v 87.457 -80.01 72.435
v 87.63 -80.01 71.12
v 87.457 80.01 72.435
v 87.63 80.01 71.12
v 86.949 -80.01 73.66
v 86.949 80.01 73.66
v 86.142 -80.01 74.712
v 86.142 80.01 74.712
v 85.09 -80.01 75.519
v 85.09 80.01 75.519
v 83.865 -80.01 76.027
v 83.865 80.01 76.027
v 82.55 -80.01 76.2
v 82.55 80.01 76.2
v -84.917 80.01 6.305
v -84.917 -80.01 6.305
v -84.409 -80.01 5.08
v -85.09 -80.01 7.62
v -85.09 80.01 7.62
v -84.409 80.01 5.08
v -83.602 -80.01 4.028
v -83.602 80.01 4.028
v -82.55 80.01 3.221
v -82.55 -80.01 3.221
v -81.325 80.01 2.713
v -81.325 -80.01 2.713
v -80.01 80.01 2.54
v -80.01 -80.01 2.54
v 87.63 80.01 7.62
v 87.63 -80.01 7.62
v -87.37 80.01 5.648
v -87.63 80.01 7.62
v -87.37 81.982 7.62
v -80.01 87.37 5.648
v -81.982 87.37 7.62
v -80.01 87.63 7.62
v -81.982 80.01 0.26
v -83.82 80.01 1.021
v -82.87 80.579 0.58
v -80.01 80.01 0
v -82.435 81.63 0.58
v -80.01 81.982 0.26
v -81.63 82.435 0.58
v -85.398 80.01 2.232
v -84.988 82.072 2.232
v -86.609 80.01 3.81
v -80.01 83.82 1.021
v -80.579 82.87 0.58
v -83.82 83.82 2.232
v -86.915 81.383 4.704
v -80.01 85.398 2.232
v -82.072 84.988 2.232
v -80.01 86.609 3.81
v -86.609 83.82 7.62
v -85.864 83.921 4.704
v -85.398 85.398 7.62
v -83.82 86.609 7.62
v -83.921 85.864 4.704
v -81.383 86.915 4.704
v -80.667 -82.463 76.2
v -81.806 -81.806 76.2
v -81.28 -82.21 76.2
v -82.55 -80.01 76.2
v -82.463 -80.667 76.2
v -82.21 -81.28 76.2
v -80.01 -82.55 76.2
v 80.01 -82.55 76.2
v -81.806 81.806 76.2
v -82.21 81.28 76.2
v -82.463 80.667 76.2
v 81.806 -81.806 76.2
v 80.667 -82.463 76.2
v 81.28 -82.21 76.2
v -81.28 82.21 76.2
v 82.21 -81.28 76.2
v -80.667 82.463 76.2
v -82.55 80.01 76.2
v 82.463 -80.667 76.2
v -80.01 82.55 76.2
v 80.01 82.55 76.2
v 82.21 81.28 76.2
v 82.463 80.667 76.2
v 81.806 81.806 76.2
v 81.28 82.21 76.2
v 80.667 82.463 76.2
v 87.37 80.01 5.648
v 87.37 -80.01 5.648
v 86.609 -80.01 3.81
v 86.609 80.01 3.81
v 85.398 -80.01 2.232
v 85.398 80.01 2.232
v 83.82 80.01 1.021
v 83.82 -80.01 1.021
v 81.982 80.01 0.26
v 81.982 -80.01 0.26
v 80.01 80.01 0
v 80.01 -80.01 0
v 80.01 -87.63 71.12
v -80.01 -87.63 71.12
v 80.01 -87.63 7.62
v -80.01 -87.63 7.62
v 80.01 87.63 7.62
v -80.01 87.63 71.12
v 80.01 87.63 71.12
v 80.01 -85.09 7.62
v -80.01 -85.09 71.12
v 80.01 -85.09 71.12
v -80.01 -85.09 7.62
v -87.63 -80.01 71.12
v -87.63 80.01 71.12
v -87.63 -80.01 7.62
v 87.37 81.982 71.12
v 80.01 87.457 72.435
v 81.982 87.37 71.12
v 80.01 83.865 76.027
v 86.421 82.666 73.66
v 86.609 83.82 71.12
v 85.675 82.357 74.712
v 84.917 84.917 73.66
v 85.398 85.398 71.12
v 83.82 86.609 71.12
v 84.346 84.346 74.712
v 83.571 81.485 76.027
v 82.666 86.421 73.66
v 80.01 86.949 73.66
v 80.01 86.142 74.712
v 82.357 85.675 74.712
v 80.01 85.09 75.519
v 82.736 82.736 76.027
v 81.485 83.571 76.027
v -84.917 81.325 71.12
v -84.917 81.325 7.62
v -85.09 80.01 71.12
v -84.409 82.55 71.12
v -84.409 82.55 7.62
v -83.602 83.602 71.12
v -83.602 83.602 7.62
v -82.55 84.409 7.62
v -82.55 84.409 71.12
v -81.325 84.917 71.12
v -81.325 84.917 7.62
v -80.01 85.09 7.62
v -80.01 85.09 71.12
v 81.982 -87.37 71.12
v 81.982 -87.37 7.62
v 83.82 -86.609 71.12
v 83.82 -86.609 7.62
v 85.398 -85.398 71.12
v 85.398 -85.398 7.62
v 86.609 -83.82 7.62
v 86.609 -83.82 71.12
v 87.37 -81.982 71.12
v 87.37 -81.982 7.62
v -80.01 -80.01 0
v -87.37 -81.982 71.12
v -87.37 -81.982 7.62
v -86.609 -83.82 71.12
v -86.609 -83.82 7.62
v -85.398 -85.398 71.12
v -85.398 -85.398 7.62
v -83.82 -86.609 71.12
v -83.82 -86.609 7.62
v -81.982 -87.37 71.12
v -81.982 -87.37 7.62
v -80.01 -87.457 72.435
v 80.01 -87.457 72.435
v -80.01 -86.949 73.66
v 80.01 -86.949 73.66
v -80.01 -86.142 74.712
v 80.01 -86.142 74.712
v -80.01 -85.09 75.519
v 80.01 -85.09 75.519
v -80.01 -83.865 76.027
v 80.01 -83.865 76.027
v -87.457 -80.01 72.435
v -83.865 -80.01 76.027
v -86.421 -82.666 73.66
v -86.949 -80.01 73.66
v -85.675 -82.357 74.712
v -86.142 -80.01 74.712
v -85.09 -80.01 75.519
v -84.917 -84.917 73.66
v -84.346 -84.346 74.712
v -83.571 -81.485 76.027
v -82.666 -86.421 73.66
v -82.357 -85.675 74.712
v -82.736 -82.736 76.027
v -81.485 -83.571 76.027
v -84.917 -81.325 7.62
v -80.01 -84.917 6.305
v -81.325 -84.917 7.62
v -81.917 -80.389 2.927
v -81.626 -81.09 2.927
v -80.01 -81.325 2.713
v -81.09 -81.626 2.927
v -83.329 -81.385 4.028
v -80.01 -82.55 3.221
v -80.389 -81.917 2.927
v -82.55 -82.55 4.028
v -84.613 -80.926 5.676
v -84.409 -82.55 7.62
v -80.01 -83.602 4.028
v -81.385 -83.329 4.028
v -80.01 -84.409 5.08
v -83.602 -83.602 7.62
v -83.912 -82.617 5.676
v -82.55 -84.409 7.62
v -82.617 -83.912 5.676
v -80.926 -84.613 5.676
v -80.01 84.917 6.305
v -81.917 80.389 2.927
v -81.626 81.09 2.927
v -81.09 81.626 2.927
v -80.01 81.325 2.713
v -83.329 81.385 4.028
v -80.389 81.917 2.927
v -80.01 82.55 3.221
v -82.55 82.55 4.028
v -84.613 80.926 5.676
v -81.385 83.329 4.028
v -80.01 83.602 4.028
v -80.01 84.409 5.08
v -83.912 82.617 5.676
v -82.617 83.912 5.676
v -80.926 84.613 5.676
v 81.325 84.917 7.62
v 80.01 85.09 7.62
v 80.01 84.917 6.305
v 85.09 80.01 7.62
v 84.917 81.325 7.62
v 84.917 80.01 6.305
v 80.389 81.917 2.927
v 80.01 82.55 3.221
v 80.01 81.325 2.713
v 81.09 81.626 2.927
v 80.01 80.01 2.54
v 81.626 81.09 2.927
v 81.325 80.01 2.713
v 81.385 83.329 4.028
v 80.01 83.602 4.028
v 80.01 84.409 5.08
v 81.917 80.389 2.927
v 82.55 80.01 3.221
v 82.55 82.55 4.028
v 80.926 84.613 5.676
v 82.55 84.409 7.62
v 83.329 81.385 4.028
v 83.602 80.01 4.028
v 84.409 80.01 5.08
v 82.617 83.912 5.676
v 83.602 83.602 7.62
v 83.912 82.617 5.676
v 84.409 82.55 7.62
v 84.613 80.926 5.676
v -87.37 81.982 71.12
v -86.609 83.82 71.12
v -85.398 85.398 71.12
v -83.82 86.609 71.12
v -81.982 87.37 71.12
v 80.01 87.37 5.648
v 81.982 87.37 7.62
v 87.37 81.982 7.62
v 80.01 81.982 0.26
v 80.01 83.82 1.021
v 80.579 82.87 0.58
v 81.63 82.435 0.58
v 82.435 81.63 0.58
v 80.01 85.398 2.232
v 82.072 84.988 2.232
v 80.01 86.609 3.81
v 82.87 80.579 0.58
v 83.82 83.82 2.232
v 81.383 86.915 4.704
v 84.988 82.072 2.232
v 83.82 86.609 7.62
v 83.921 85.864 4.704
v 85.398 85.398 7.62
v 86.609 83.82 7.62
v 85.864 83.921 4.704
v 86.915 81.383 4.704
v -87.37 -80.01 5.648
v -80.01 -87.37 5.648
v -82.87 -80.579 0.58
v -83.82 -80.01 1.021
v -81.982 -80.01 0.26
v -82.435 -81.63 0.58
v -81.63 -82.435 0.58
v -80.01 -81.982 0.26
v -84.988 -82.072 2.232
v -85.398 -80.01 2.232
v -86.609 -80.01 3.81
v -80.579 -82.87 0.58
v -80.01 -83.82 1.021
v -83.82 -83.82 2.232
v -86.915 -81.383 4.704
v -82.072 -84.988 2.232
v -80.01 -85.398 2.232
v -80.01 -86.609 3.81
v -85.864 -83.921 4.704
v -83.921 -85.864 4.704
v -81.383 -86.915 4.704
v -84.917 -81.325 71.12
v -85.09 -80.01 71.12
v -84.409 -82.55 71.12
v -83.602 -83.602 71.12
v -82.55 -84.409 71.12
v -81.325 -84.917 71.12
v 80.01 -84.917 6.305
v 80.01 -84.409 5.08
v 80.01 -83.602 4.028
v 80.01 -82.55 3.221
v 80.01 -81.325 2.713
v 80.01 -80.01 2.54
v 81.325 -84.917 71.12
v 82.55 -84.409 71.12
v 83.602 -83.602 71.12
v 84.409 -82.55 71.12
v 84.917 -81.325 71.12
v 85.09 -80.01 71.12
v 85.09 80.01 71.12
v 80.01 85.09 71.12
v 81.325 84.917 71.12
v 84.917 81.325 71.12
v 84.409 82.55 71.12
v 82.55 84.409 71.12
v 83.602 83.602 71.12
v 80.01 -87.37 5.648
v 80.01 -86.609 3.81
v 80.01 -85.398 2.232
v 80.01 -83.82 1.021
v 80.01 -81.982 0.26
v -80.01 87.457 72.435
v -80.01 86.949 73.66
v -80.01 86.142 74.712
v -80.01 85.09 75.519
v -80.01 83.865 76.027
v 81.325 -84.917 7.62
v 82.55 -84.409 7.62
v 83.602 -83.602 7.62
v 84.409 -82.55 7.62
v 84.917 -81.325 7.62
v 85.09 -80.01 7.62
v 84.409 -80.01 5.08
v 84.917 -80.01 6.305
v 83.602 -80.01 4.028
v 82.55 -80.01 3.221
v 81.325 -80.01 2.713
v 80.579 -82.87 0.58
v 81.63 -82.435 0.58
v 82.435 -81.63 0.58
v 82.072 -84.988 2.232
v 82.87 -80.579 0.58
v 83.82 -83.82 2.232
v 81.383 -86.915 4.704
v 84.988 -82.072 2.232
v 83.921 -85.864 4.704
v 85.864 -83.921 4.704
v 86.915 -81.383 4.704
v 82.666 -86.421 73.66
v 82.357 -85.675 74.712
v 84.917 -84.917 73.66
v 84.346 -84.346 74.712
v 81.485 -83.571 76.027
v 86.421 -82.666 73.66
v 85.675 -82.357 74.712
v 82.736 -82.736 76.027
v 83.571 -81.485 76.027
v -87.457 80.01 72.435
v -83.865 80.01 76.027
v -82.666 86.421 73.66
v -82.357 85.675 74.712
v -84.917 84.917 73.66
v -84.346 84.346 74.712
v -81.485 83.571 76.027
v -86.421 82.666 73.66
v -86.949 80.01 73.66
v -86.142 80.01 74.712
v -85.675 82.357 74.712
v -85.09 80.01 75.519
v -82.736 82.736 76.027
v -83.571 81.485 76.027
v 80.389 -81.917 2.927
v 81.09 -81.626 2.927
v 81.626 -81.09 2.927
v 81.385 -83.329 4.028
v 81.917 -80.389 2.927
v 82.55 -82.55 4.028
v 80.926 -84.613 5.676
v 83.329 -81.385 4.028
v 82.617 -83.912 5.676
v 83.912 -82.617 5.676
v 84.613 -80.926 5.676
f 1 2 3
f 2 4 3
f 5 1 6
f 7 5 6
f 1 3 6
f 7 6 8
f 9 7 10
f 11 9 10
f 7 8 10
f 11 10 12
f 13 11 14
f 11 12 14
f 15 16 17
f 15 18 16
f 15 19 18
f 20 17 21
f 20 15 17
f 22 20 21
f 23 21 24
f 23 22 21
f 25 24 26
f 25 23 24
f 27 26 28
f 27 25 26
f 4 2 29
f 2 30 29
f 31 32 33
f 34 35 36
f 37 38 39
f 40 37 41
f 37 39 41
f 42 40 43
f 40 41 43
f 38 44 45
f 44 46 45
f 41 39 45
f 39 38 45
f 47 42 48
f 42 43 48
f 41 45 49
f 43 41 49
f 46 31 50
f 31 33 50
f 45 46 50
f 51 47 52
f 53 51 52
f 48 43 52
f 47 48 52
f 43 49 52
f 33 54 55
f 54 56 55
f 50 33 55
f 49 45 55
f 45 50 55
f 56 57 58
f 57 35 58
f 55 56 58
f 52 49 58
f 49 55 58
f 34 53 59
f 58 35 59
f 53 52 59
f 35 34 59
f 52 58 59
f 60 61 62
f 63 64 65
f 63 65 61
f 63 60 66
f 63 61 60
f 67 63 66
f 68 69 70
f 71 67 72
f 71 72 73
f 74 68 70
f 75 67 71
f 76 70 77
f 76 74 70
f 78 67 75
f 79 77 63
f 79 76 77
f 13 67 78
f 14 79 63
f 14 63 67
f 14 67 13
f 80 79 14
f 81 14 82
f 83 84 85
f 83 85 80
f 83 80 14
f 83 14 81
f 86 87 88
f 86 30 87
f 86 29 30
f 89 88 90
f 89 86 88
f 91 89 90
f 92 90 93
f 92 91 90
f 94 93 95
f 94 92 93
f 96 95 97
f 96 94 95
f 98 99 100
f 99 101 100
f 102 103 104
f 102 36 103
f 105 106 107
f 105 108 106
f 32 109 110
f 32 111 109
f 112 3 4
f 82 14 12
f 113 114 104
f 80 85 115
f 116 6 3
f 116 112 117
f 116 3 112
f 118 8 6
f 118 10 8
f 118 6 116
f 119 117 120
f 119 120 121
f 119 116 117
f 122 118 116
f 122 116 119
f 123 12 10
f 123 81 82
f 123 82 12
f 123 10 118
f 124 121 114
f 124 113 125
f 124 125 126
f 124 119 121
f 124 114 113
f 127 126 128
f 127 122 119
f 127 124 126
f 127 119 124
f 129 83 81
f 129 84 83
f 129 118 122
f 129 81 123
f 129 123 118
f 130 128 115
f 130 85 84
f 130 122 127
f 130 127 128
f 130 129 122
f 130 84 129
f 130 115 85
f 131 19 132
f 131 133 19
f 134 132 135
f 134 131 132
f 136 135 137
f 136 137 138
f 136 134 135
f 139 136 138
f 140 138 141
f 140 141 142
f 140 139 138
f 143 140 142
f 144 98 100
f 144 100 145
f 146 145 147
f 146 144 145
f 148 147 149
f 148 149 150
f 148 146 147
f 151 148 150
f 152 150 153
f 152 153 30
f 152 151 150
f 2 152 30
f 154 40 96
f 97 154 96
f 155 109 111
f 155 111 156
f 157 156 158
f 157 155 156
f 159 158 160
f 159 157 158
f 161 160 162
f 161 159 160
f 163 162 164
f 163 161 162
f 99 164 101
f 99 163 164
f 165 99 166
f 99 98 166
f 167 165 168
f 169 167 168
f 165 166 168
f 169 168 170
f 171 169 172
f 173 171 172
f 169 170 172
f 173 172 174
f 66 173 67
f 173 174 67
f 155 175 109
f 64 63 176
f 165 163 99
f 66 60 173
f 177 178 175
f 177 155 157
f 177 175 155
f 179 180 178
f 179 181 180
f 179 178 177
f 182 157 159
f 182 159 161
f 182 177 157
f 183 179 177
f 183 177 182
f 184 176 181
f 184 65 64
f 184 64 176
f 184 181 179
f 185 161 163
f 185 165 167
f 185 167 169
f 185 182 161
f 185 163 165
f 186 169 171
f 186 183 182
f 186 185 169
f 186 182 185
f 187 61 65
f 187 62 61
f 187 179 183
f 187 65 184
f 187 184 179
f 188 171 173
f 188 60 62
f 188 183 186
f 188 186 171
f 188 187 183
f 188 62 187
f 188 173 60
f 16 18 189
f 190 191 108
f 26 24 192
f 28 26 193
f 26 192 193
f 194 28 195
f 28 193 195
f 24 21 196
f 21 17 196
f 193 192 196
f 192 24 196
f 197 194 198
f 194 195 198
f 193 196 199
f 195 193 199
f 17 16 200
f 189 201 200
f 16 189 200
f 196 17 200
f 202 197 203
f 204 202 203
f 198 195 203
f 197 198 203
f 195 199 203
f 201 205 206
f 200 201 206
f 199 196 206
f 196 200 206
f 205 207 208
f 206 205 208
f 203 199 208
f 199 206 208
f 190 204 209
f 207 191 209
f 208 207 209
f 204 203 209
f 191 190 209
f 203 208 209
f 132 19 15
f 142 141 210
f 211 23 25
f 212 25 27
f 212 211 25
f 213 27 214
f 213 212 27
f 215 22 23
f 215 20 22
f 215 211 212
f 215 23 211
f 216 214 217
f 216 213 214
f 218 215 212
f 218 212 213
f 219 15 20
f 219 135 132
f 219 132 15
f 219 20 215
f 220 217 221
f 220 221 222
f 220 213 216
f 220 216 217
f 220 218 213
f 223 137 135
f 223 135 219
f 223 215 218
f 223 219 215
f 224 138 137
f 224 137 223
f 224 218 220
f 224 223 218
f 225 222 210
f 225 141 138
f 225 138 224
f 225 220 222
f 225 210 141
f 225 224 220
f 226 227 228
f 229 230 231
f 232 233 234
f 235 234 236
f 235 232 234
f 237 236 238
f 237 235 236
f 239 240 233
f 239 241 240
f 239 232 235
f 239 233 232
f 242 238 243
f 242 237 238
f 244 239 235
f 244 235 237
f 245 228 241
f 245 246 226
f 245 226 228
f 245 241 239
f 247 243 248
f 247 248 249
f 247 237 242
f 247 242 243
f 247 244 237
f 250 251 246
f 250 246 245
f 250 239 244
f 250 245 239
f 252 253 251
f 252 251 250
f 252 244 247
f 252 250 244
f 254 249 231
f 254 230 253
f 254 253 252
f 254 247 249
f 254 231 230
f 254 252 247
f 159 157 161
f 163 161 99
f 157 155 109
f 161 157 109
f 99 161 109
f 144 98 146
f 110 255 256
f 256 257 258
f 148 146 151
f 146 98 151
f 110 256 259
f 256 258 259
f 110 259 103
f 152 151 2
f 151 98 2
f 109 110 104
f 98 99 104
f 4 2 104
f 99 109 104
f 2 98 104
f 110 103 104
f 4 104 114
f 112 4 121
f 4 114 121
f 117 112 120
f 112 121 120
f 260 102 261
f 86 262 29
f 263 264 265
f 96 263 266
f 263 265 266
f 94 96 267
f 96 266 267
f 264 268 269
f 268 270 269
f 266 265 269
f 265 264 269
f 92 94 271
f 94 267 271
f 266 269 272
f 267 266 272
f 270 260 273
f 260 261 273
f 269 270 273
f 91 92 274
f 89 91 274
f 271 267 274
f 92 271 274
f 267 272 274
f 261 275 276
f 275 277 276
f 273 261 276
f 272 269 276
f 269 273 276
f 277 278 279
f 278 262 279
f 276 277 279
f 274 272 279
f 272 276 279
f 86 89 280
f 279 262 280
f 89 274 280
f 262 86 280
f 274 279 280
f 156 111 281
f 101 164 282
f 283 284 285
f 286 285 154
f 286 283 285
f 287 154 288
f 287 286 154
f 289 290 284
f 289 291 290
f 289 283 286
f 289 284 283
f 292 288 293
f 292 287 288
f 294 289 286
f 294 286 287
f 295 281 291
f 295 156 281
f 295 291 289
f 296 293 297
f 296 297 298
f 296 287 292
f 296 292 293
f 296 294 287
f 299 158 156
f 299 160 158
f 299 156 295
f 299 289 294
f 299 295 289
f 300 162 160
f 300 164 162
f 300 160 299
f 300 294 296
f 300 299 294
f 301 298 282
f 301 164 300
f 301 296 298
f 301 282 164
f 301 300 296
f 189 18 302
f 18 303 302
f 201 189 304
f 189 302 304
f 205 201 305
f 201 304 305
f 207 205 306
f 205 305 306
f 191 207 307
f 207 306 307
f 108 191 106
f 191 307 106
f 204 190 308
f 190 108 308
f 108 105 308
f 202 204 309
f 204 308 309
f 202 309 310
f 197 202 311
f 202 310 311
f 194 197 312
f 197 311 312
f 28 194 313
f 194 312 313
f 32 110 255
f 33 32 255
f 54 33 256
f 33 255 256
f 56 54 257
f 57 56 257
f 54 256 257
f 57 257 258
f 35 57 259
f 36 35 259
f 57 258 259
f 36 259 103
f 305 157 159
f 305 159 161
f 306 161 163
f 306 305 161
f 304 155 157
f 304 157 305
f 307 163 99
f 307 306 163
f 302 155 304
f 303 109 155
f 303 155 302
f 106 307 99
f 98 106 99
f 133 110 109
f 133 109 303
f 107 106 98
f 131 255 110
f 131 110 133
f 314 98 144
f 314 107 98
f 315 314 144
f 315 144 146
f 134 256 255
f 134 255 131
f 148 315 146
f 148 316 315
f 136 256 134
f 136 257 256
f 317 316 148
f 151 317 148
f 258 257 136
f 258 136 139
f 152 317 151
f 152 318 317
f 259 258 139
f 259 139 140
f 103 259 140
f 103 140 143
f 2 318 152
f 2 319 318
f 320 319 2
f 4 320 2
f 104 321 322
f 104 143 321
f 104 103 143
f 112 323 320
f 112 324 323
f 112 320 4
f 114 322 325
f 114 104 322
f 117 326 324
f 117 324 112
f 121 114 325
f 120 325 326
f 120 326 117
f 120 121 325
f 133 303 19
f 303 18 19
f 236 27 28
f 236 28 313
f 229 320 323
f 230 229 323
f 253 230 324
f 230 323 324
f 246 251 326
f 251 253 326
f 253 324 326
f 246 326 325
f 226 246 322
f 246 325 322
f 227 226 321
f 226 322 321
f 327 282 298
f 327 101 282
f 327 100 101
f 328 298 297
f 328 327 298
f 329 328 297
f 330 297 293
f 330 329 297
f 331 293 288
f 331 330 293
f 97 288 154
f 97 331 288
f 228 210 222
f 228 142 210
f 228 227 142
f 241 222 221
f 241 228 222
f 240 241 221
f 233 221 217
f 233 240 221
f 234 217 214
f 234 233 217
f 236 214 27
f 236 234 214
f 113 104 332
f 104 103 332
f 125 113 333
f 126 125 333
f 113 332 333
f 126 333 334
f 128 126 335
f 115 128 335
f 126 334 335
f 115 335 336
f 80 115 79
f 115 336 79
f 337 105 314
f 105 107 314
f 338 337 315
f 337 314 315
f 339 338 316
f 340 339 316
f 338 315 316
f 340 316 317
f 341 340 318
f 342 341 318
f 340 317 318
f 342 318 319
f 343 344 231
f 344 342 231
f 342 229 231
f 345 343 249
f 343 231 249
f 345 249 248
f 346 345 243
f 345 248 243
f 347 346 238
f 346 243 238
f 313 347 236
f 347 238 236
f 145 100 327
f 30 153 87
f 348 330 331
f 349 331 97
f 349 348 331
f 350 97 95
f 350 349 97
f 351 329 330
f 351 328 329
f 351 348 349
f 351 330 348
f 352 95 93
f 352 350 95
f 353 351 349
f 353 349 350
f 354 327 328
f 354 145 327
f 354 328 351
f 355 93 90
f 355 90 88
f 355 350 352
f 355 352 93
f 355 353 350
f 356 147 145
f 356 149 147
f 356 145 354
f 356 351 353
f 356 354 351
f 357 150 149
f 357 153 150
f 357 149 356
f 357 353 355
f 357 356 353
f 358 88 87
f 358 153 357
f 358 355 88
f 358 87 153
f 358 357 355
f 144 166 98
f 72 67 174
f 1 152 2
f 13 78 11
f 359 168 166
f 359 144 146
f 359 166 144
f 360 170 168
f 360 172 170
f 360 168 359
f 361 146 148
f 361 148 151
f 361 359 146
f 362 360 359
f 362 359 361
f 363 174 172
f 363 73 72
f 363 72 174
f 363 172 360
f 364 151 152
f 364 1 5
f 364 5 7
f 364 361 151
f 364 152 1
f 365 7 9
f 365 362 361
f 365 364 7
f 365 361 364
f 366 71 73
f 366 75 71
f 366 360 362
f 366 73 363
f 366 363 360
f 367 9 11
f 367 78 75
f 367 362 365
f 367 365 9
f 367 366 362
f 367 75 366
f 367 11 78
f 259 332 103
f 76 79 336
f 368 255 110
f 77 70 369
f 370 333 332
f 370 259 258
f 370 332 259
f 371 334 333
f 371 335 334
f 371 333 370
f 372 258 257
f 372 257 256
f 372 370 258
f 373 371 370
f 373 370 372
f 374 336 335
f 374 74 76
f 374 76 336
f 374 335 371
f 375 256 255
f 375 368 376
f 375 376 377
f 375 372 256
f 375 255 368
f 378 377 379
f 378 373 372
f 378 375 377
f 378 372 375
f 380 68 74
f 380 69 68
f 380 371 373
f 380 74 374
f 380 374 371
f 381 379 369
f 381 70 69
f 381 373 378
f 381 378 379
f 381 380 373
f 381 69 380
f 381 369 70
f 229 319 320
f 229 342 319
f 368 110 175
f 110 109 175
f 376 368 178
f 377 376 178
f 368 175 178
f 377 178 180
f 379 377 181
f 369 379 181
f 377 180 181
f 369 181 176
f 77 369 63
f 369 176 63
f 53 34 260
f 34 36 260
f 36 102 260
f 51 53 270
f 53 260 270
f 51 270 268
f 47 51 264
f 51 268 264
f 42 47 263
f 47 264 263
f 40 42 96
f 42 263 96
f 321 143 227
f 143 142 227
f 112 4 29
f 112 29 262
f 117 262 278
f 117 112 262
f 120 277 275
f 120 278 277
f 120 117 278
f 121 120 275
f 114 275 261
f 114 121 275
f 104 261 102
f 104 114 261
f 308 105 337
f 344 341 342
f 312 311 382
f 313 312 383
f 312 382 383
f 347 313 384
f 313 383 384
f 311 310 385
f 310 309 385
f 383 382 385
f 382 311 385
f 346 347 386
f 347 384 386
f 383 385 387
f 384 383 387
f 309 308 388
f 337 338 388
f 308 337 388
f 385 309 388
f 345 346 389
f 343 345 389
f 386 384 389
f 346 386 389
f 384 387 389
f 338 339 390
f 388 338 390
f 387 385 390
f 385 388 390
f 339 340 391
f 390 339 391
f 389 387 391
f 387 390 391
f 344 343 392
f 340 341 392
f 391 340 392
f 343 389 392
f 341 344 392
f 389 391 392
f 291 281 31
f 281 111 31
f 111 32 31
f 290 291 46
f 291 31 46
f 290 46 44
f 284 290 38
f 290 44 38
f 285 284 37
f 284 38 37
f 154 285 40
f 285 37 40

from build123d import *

# Parameters (mm, degrees)
F0_W     = 175.26
F0_H     = 175.26
F1_DEPTH = 71.12
F2_R     = 7.62
F3_T     = -2.54
F5_DEPTH = 5.08
F6_R     = 5.07999


# Not quite as in the source:
# - a fillet or chamfer is up to 0.001 mm smaller than in the source, because OpenCascade refuses the exact size


with BuildPart() as f1:
    # F0 (on Top) → F1 (new body)
    with BuildSketch(Plane.XY):
        Rectangle(F0_W, F0_H)
    extrude(amount=F1_DEPTH)

    # F2
    f2_edges = [f1.edges().sort_by_distance(p)[0] for p in [
        (-87.63, 87.63, 35.56),
        (87.63, 87.63, 35.56),
        (-87.63, -87.63, 35.56),
        (87.63, -87.63, 35.56),
        (-87.63, 0, 0),
        (0, -87.63, 0),
        (0, 87.63, 0),
        (87.63, 0, 0),
    ]]
    fillet(f2_edges, radius=F2_R)

    # F3
    f3_openings = [f1.faces().sort_by_distance(p)[0] for p in [
        (0, 0, 71.12),
    ]]
    offset(amount=F3_T, openings=f3_openings)


with BuildPart() as f5:
    # F4 (on face) → F5 (new body)
    with BuildSketch(Plane.XY.offset(71.12)):
        with BuildLine():
            Line((80.01, 87.63), (-80.01, 87.63))
            ThreePointArc((-80.01, 87.63), (-85.3981536726, 85.3981536726), (-87.63, 80.01))
            Line((-87.63, 80.01), (-87.63, -80.01))
            ThreePointArc((-87.63, -80.01), (-85.3981536726, -85.3981536726), (-80.01, -87.63))
            Line((-80.01, -87.63), (80.01, -87.63))
            ThreePointArc((80.01, -87.63), (85.3981536726, -85.3981536726), (87.63, -80.01))
            Line((87.63, -80.01), (87.63, 80.01))
            ThreePointArc((87.63, 80.01), (85.3981536726, 85.3981536726), (80.01, 87.63))
        make_face()
    extrude(amount=F5_DEPTH)

    # F6 (radius 5.08 in the source; OpenCascade refuses exactly that, so slightly less here)
    f6_edges = [f5.edges().sort_by_distance(p)[0] for p in [
        (87.63, 0, 76.2),
    ]]
    fillet(f6_edges, radius=F6_R)


solid = Compound([f1.part, f5.part])
